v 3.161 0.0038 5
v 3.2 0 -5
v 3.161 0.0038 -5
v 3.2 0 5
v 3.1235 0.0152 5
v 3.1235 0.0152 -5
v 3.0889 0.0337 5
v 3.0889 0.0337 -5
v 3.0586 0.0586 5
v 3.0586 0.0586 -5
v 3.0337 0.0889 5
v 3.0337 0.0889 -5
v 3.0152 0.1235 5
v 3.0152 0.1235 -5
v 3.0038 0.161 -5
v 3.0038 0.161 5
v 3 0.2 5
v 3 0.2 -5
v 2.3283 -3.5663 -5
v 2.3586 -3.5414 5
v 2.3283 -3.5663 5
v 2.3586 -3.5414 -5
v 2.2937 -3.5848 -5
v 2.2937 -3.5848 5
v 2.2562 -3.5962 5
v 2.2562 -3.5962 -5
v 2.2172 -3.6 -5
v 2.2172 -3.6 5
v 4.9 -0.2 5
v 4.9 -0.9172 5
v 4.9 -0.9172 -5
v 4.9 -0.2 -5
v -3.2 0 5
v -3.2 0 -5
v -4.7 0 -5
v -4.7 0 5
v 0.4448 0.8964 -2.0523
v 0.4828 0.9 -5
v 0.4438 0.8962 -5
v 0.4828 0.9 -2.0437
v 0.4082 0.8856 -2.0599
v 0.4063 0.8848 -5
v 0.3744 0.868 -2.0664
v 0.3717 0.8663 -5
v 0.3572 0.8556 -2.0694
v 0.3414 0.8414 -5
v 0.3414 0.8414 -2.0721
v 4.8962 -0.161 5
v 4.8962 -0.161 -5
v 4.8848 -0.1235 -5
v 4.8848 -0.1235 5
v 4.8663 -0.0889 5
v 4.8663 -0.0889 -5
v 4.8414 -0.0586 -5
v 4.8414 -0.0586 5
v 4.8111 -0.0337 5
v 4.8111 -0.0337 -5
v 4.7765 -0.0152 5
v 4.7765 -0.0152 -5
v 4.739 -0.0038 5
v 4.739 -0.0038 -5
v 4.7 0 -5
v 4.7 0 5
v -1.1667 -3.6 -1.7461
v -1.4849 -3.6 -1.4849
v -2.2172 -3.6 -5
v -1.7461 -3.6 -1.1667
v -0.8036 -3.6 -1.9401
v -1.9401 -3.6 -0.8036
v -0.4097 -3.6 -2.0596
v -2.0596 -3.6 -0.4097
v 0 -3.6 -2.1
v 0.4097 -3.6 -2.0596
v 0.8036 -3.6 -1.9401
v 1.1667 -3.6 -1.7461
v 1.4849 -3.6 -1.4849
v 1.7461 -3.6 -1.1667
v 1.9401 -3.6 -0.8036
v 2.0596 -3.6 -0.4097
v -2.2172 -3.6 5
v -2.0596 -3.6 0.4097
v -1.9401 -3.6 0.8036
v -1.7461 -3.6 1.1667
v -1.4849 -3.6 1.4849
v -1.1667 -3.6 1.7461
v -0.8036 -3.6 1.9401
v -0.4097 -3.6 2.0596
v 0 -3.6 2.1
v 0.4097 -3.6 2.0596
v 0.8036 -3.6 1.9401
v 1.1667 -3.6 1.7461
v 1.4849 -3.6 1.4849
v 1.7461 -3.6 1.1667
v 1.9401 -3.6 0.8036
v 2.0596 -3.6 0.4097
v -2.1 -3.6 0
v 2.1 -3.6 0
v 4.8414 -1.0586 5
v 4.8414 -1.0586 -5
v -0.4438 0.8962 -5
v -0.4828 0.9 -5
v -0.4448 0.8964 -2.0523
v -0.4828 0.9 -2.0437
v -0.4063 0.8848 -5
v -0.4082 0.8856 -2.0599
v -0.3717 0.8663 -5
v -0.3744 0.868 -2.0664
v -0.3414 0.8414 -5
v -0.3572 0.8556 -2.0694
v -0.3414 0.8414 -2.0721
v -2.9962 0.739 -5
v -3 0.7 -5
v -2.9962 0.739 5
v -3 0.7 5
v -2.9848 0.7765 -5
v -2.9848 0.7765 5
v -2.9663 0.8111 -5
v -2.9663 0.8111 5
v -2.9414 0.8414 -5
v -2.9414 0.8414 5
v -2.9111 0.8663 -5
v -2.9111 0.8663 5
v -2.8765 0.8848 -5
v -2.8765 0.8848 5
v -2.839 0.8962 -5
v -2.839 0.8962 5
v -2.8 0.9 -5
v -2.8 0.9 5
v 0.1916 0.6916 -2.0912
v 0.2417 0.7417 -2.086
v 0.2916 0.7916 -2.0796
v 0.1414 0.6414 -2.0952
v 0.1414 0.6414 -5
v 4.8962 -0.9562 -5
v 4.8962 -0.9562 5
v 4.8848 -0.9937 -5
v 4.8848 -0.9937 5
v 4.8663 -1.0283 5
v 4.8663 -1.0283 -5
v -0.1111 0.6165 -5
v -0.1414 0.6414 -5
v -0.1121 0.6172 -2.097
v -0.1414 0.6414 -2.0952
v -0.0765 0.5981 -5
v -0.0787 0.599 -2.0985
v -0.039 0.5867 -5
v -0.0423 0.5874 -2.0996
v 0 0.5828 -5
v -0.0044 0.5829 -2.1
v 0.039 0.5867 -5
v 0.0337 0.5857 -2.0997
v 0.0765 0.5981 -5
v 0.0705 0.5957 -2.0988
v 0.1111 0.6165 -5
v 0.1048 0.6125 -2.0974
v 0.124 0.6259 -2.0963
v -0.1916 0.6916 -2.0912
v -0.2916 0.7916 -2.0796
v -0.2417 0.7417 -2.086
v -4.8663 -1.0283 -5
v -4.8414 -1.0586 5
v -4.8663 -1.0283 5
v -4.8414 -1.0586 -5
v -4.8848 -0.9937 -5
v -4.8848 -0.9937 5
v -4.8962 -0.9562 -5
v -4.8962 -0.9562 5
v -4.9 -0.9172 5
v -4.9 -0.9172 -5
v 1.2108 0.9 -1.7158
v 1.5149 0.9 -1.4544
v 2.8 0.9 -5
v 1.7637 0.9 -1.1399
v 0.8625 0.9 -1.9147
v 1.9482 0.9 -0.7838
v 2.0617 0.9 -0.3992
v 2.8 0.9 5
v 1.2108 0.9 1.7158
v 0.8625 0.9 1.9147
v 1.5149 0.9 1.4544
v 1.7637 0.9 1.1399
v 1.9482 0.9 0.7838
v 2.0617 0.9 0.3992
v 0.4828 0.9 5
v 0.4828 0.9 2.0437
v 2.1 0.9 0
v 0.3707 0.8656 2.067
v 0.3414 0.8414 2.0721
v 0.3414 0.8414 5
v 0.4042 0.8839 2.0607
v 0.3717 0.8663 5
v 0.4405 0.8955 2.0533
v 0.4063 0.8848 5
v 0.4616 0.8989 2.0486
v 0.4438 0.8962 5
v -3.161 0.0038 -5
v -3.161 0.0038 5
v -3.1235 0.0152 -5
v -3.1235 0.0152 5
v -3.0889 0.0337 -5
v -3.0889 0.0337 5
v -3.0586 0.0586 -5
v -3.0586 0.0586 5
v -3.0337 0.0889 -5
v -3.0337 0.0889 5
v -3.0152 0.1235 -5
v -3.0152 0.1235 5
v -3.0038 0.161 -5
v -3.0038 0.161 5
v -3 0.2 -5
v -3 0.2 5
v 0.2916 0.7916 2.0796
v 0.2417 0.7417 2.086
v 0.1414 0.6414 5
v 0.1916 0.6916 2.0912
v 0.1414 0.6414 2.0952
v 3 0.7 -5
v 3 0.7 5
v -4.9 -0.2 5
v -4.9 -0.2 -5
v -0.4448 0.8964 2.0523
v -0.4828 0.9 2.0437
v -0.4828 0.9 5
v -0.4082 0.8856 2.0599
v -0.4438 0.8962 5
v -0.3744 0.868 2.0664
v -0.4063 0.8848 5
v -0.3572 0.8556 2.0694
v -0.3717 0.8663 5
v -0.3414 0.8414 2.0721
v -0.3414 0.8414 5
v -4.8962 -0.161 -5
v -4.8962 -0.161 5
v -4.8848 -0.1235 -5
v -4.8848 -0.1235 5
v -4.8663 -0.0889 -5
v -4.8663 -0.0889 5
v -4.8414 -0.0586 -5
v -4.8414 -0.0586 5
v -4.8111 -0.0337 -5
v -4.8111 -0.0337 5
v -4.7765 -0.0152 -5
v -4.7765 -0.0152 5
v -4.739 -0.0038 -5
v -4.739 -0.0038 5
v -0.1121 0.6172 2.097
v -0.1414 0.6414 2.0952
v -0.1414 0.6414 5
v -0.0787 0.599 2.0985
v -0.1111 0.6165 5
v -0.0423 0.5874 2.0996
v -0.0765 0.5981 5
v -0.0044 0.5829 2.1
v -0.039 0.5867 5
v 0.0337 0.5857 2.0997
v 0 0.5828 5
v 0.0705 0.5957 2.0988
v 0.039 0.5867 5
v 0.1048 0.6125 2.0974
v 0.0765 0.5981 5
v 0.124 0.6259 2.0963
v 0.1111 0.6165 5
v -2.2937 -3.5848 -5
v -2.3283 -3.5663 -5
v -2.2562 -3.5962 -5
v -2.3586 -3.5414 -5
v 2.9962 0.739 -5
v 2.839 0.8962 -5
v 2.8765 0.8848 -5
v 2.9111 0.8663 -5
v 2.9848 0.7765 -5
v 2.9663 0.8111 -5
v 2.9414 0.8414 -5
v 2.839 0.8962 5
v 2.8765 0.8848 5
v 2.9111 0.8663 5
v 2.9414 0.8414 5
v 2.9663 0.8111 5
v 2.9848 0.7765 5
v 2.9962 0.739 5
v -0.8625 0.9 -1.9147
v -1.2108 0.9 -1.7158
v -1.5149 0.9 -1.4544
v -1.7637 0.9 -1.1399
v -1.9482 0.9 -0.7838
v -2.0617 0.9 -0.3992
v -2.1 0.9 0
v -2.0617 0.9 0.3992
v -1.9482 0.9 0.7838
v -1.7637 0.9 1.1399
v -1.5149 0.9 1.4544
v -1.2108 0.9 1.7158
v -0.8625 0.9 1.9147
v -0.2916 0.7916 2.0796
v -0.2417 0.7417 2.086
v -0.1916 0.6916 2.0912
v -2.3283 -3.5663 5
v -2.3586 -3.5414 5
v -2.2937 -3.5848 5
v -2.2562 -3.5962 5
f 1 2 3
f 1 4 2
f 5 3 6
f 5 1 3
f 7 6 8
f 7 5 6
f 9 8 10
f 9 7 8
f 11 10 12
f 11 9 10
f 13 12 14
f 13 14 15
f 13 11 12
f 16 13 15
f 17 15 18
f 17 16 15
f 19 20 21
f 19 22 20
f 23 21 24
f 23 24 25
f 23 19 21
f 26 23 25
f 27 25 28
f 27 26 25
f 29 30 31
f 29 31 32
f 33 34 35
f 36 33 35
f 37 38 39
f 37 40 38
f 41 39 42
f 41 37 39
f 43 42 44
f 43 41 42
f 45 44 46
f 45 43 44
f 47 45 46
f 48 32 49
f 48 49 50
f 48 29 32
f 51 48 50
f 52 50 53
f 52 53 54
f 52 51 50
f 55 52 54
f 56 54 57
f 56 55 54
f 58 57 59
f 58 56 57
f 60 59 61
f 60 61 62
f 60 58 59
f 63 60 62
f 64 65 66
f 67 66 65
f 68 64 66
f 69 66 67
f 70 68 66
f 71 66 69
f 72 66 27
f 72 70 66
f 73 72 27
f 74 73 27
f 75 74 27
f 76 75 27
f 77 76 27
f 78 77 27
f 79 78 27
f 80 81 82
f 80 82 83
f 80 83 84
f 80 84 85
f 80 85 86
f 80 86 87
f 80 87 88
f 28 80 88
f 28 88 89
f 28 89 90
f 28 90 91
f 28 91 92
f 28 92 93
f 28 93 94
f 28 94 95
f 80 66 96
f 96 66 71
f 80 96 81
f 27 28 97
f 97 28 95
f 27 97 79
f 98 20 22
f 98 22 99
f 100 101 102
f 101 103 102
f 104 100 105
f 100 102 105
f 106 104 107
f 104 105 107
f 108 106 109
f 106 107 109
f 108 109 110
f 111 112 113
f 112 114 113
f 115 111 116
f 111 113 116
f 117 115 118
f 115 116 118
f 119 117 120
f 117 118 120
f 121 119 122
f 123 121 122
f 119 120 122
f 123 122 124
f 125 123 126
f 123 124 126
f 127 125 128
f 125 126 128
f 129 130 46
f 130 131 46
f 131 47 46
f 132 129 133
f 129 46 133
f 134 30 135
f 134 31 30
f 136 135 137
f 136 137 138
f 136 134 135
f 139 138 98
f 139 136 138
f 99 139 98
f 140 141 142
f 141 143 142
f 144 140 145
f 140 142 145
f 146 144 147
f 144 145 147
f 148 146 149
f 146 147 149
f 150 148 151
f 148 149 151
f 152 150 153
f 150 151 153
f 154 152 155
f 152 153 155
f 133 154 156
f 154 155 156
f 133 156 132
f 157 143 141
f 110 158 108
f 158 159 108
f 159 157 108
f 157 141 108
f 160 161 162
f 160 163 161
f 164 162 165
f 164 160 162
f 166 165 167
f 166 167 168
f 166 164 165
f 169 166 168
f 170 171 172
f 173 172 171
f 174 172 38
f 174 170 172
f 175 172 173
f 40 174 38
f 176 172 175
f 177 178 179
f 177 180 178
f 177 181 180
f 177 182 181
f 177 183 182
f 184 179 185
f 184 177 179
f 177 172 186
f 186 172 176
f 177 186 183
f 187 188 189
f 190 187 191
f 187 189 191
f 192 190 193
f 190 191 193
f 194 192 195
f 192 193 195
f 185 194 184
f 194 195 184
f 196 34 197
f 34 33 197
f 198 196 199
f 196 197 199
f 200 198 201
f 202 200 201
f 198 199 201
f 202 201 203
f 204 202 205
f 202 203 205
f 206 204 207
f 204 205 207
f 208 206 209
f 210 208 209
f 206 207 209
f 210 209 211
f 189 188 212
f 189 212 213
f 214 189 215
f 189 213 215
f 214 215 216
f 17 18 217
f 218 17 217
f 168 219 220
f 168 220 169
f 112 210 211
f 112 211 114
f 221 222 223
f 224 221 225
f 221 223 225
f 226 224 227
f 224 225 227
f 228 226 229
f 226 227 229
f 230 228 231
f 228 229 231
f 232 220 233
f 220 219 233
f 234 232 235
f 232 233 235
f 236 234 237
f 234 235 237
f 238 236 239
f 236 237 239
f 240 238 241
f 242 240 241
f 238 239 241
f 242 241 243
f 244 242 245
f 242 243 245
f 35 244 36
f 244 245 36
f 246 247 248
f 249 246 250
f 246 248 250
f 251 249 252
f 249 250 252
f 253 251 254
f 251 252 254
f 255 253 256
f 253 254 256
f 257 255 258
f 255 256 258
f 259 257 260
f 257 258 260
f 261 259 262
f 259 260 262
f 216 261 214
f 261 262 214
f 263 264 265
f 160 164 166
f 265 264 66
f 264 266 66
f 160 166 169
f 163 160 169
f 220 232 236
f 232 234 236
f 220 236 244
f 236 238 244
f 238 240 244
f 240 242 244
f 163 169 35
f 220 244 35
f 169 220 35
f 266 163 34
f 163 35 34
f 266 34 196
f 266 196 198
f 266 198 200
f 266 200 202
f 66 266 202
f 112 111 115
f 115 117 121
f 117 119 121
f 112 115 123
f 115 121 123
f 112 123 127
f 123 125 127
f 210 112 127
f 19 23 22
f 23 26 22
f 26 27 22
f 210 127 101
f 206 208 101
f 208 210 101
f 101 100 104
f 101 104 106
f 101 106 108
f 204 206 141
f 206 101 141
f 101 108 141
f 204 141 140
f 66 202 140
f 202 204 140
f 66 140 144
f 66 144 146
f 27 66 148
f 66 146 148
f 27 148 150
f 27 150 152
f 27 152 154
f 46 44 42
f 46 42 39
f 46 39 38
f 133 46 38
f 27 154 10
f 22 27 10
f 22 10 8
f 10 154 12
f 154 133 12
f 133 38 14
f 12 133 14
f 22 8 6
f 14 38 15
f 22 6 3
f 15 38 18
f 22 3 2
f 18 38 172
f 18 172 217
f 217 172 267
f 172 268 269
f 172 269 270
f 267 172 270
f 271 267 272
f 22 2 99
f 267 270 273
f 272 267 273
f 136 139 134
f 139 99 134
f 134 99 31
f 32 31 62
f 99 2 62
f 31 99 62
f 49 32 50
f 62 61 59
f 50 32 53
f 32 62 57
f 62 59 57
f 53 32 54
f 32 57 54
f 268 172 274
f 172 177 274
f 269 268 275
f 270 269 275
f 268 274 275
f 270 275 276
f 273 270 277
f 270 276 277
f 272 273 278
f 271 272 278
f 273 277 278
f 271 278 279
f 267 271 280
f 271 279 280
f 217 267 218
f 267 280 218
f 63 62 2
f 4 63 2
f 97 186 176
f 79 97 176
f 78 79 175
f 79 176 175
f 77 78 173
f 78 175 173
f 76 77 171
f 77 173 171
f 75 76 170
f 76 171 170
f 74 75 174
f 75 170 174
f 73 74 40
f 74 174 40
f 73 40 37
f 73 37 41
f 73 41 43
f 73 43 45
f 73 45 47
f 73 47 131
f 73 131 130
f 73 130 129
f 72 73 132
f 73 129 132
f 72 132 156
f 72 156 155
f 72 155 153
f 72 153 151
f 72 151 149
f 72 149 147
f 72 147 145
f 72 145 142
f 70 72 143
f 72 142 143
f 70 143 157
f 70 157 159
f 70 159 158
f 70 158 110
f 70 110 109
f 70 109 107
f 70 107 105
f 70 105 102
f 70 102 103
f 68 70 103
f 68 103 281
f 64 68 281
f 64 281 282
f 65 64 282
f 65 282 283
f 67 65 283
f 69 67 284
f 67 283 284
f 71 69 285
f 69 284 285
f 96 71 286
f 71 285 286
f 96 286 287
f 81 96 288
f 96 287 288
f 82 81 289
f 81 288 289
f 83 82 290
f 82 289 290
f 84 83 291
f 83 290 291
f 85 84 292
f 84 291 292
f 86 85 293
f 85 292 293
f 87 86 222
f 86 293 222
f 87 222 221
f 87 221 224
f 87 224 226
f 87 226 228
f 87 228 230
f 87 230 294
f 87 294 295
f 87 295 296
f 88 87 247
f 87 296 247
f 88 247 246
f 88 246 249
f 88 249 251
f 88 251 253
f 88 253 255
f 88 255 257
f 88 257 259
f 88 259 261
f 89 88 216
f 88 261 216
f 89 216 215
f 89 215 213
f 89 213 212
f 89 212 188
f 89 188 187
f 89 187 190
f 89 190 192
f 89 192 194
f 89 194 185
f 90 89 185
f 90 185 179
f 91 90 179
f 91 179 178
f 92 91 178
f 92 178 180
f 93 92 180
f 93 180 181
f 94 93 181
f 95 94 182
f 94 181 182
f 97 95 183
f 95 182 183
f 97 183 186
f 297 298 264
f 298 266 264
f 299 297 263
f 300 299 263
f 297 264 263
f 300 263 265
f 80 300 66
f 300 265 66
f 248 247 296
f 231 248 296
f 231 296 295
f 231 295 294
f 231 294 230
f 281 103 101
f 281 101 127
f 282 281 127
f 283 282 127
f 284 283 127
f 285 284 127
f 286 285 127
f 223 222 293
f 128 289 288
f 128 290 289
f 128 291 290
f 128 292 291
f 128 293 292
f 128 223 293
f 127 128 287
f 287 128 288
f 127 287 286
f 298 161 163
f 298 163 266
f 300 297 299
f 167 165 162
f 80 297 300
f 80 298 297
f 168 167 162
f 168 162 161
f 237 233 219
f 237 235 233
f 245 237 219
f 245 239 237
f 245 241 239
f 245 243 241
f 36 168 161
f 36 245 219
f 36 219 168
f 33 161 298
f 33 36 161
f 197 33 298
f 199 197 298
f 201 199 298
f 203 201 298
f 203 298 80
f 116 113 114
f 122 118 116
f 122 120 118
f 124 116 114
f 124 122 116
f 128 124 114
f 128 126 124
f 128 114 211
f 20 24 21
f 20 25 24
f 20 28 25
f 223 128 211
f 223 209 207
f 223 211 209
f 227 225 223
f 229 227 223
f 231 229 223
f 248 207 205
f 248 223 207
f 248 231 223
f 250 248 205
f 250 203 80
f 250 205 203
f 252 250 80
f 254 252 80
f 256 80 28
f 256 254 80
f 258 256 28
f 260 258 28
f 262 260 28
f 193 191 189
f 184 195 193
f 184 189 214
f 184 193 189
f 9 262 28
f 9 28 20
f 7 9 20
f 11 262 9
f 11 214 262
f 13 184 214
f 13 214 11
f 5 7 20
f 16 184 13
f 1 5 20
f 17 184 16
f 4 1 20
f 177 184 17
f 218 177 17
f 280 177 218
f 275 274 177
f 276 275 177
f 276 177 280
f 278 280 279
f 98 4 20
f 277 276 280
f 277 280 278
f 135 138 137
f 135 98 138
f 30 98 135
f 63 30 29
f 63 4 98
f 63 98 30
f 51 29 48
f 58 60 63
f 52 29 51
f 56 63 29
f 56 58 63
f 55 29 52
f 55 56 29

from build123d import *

# Parameters (mm, degrees)
BOSS_EXTRUDE1_DEPTH            = 10
SKETCH2_W                      = 1.9
SKETCH2_H                      = 0.9
CUT_EXTRUDE1_DEPTH             = 12.703418304
SKETCH3_W                      = 1.9
SKETCH3_H                      = 0.9
CUT_EXTRUDE2_DEPTH             = 12.703418304
CUT_EXTRUDE3_DEPTH             = 12.703418304
F_4_2_4_2_DIAMETER_HOLE1_D     = 4.2
F_4_2_4_2_DIAMETER_HOLE1_DEPTH = 4.5
FILLET1_R                      = 0.2


with BuildPart() as part:
    # Sketch1 → Boss-Extrude1 (new body)
    with BuildSketch(Plane.XY.offset(5)):
        Polygon((4.9, -1), (4.9, 0.9), (-4.9, 0.9), (-4.9, -1), (-2.3, -3.6), (2.3, -3.6), align=None)
    extrude(amount=-BOSS_EXTRUDE1_DEPTH)

    # Sketch2 → Cut-Extrude1 (cut, through all)
    with BuildSketch(Plane(origin=(0, 0, -5), x_dir=(-1, 0, 0), z_dir=(0, 0, -1))):
        with Locations((3.95, 0.45)):
            Rectangle(SKETCH2_W, SKETCH2_H)
    extrude(amount=-CUT_EXTRUDE1_DEPTH, mode=Mode.SUBTRACT)

    # Sketch3 → Cut-Extrude2 (cut, through all)
    with BuildSketch(Plane(origin=(0, 0, -5), x_dir=(-1, 0, 0), z_dir=(0, 0, -1))):
        with Locations((-3.95, 0.45)):
            Rectangle(SKETCH3_W, SKETCH3_H)
    extrude(amount=-CUT_EXTRUDE2_DEPTH, mode=Mode.SUBTRACT)

    # Sketch4 → Cut-Extrude3 (cut, through all)
    with BuildSketch(Plane(origin=(0, 0, -5), x_dir=(-1, 0, 0), z_dir=(0, 0, -1))):
        Polygon((0.4, 0.9), (-0.4, 0.9), (0, 0.5), align=None)
    extrude(amount=-CUT_EXTRUDE3_DEPTH, mode=Mode.SUBTRACT)

    # Ø4.2 (4.2) Diameter Hole1
    with Locations(Plane(origin=(0, -3.6, 0), x_dir=(-1, 0, 0), z_dir=(0, -1, 0))):
        with Locations((0, 0)):
            Hole(F_4_2_4_2_DIAMETER_HOLE1_D / 2, depth=F_4_2_4_2_DIAMETER_HOLE1_DEPTH)

    # Fillet1
    fillet1_edges = [part.edges().sort_by_distance(p)[0] for p in [
        (4.9, 0, 0),
        (3, 0, 0),
        (-4.9, -1, 0),
        (3, 0.9, 0),
        (-3, 0, 0),
        (0.4, 0.9, -3.530776406),
        (0, 0.5, 3.55),
        (-0.4, 0.9, -3.530776406),
        (4.9, -1, 0),
        (-3, 0.9, 0),
        (0, 0.5, -3.55),
        (-0.4, 0.9, 3.530776406),
        (-4.9, 0, 0),
        (-2.3, -3.6, 0),
        (0.4, 0.9, 3.530776406),
        (2.3, -3.6, 0),
    ]]
    fillet(fillet1_edges, radius=FILLET1_R)


solid = part.part
